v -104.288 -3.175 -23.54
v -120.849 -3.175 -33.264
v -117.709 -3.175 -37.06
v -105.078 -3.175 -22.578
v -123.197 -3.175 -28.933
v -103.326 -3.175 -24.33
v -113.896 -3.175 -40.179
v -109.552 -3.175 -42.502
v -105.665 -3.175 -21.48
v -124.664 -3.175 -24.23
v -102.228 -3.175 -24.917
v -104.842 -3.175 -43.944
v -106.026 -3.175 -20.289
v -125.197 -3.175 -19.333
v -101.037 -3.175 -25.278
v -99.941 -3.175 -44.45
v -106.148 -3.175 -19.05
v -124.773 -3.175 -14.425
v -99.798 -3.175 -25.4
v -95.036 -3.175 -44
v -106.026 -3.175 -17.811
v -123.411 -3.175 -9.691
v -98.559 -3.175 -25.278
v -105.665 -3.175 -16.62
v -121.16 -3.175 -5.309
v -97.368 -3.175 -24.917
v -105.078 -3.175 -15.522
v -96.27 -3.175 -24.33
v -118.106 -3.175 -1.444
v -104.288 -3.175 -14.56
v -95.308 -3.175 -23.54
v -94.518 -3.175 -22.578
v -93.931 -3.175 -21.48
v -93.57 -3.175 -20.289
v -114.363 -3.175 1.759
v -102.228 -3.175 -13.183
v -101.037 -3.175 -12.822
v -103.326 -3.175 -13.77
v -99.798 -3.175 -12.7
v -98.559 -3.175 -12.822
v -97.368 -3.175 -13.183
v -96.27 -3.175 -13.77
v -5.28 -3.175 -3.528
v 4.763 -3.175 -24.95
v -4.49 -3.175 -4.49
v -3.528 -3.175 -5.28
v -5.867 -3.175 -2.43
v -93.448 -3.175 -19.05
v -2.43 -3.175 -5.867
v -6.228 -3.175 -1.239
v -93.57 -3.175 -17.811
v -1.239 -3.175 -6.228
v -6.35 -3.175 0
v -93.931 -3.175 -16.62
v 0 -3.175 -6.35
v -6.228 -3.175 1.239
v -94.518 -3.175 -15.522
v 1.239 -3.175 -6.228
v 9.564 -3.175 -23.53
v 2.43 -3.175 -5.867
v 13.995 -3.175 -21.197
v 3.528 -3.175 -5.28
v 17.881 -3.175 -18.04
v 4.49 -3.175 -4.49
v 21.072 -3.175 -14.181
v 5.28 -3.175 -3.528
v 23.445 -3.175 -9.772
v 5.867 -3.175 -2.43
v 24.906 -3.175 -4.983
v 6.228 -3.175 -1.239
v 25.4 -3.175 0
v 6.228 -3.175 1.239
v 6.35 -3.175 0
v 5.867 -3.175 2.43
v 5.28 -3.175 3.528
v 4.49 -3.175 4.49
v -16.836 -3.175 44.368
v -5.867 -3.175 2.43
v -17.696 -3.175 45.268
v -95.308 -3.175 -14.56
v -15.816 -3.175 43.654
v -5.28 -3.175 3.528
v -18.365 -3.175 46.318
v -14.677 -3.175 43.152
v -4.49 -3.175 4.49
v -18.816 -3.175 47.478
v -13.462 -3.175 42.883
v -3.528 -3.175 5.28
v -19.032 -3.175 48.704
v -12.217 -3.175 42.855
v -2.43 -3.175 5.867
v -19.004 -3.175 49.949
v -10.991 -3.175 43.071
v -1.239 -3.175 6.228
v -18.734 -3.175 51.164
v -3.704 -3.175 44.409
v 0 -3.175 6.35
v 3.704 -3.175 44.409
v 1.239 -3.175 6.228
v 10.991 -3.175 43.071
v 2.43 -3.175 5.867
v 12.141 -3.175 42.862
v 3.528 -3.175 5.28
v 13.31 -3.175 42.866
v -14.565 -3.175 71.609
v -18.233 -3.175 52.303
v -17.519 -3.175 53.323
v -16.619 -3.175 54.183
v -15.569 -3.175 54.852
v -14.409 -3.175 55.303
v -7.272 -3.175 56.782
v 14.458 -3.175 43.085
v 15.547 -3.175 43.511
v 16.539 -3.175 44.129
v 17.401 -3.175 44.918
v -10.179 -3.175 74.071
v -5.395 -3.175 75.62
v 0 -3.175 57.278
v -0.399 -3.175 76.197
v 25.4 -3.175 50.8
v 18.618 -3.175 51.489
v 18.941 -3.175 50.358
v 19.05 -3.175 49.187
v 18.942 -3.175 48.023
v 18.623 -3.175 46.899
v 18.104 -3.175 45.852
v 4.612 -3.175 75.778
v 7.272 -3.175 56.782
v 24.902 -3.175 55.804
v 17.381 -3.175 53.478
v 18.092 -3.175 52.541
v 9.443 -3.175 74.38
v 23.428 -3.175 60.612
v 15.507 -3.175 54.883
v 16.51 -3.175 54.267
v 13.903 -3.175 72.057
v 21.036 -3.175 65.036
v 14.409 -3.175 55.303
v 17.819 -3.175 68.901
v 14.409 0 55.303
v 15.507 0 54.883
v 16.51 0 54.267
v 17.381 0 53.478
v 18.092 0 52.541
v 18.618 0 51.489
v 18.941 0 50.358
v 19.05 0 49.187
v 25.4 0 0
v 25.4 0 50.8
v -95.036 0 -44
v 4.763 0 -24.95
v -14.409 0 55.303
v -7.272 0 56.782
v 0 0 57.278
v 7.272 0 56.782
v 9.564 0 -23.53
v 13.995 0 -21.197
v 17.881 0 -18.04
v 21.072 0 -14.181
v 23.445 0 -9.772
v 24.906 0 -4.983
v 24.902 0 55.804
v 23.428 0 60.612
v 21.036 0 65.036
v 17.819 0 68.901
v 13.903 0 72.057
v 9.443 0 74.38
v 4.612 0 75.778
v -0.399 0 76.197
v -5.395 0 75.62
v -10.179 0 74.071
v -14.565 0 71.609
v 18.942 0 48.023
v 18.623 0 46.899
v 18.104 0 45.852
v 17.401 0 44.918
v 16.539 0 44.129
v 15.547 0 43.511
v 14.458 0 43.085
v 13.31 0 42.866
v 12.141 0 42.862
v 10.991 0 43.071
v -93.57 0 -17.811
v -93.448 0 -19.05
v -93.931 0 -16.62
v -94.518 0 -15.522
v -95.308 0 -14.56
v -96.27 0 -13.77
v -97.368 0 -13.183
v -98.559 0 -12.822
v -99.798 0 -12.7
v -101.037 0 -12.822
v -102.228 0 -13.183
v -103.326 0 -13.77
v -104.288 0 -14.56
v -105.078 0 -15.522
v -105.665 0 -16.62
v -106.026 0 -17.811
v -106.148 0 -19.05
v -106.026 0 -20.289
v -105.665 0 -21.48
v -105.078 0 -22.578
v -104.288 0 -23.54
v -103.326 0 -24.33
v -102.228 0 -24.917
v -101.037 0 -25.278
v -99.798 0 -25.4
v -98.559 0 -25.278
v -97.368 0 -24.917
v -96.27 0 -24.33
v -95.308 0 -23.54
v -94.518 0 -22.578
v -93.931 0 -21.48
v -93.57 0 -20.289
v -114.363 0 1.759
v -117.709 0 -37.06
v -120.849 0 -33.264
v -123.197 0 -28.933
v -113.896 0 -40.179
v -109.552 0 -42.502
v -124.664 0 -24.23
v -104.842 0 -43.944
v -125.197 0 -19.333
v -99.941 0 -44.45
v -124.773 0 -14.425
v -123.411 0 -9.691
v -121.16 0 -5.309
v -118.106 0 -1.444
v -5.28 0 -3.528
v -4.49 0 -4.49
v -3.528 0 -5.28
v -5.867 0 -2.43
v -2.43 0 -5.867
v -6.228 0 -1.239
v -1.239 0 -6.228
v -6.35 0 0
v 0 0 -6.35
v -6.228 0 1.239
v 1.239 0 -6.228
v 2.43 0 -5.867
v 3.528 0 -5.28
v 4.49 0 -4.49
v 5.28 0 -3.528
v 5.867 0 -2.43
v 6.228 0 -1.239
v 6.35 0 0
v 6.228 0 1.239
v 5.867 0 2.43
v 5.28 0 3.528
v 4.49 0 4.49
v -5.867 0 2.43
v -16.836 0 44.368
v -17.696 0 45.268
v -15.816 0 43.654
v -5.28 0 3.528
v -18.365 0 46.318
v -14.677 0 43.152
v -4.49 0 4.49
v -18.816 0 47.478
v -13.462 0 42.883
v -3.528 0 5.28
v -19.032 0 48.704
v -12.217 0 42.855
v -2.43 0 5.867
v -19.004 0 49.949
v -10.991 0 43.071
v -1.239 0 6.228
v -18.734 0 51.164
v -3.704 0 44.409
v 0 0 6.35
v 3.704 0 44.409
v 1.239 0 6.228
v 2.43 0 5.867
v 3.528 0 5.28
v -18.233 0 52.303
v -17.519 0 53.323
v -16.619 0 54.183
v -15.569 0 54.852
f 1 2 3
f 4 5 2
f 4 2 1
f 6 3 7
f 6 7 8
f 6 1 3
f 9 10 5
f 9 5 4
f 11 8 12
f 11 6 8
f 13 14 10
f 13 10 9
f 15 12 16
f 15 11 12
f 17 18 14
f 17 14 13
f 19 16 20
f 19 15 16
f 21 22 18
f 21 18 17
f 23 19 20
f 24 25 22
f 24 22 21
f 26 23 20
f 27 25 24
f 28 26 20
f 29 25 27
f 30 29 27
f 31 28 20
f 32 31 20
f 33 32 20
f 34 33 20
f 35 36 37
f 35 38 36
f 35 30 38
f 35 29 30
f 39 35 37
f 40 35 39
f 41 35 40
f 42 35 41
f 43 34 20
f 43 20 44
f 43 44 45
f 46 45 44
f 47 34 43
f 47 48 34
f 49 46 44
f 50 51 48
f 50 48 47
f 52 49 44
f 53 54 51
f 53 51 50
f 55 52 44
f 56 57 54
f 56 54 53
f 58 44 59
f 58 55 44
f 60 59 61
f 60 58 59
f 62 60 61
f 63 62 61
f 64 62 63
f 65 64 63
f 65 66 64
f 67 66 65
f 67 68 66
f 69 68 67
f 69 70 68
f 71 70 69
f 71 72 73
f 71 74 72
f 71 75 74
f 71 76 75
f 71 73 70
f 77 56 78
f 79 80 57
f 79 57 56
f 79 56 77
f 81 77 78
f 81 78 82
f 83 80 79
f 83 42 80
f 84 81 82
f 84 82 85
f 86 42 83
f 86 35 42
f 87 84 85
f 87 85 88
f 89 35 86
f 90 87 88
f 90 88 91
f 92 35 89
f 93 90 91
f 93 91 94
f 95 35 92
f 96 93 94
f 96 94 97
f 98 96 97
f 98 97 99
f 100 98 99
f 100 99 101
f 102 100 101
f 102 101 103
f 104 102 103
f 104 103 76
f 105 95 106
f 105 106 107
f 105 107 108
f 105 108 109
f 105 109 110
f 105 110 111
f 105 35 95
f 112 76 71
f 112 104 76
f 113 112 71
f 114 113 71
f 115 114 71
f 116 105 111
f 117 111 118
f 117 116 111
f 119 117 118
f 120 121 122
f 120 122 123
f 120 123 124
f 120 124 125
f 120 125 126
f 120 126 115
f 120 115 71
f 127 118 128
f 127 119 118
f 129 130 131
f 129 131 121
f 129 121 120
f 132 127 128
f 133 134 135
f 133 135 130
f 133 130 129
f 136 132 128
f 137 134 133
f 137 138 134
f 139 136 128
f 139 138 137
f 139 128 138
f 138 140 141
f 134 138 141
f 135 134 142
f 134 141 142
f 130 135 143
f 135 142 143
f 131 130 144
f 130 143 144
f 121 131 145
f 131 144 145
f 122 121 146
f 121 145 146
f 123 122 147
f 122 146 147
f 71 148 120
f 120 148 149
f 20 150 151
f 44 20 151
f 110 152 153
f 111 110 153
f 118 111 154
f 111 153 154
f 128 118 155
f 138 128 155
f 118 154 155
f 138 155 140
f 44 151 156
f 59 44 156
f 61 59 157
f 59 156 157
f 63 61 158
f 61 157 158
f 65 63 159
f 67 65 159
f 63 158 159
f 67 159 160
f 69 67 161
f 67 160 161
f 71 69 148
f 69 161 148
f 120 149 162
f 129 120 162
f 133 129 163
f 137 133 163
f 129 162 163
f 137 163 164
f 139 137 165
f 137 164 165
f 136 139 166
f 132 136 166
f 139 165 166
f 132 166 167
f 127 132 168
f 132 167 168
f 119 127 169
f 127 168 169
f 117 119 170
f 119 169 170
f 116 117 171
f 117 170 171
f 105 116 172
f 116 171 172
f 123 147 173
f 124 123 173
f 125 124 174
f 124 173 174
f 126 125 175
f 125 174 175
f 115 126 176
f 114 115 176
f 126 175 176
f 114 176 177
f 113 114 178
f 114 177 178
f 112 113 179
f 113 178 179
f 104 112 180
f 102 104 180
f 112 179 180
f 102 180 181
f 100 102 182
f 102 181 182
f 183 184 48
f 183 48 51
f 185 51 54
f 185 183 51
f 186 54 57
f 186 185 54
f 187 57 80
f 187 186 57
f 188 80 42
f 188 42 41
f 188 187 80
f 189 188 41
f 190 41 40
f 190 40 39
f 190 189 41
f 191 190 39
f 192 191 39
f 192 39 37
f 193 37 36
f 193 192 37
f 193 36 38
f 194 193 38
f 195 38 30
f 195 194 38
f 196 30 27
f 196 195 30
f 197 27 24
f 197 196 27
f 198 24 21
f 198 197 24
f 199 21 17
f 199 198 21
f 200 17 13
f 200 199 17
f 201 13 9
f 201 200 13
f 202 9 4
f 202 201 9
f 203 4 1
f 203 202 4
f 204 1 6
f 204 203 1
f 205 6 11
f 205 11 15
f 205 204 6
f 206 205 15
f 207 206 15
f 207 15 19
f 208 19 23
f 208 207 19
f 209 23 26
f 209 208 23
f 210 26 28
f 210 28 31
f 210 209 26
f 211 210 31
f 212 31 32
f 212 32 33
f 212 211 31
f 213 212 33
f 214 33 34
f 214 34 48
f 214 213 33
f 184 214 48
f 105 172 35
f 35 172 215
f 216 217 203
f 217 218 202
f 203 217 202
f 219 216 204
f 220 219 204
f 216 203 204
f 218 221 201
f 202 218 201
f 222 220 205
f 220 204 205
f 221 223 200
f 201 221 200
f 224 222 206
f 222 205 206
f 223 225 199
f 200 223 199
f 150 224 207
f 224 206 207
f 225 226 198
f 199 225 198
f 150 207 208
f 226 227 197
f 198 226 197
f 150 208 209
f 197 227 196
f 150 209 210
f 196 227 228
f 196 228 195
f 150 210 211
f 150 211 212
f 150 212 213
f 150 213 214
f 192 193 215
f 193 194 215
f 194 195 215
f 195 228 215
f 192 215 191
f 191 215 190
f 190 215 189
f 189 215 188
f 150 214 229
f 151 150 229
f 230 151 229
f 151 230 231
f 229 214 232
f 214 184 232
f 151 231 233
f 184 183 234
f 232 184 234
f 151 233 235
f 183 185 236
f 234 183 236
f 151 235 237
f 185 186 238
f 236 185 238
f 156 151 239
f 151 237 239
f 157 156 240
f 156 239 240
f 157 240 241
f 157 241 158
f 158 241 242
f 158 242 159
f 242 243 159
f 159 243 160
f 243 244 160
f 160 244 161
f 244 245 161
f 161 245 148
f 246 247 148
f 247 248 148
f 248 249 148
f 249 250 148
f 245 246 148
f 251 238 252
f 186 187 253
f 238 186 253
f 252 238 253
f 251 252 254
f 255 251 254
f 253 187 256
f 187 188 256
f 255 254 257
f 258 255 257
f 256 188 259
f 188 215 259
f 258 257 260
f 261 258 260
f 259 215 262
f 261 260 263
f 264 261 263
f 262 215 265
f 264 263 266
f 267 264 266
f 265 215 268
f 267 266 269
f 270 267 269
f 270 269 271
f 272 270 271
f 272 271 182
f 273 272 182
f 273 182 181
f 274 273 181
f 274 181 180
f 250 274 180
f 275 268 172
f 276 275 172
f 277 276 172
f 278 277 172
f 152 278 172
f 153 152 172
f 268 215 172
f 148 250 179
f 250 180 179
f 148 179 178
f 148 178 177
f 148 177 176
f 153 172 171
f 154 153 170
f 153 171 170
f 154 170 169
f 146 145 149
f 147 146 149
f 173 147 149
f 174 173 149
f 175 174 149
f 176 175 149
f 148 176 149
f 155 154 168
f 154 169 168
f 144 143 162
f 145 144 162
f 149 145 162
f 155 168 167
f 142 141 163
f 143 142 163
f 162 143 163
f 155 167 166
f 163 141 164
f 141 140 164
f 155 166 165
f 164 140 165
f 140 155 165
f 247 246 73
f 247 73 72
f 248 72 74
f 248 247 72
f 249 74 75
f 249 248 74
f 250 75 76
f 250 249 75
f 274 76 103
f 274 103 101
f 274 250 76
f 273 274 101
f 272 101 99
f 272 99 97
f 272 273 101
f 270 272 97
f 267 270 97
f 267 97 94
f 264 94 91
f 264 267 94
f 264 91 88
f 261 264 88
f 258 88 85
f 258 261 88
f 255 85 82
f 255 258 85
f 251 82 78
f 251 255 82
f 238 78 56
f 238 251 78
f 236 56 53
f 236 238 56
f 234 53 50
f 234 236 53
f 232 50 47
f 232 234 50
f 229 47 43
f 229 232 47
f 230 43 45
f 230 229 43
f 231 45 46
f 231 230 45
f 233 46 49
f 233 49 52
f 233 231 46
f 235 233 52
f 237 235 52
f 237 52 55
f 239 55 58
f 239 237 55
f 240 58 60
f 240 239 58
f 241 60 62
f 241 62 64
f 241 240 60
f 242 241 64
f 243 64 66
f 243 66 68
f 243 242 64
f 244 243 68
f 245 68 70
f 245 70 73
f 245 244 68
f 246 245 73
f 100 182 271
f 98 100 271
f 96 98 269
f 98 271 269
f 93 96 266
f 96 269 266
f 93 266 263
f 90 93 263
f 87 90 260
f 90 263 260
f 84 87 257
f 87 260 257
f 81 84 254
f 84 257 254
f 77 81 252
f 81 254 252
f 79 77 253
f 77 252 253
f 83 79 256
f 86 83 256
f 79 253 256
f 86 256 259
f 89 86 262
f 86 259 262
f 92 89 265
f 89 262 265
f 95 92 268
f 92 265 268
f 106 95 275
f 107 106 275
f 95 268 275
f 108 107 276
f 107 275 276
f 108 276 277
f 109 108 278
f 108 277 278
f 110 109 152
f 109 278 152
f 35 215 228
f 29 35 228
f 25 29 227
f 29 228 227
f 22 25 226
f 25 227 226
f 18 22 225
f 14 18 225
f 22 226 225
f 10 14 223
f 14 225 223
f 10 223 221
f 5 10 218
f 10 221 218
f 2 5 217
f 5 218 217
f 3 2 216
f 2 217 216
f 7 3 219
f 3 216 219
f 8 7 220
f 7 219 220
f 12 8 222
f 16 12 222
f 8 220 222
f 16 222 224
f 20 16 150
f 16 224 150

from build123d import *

# Parameters (mm, degrees)
F0_R     = 6.35
F1_DEPTH = 3.175


with BuildPart() as f1:
    # F0 (on Front) → F1 (new body)
    with BuildSketch(Plane.XZ):
        with BuildLine():
            ThreePointArc((0, 25.4), (-25.287129, -2.391879), (4.7625, -24.949521))
            ThreePointArc((4.7625, -24.949521), (19.572014, -16.189387), (25.4, 0))
            ThreePointArc((25.4, 0), (17.960512, 17.960512), (0, 25.4))
        make_face()
        Circle(F0_R, mode=Mode.SUBTRACT)
        with BuildLine():
            Line((-95.035584, -43.999521), (4.7625, -24.949521))
            ThreePointArc((4.7625, -24.949521), (-25.287129, -2.391879), (0, 25.4))
            ThreePointArc((0, 25.4), (-24.225165, 43.164465), (-14.564732, 71.609339))
            Line((-14.564732, 71.609339), (-114.362815, 1.759339))
            ThreePointArc((-114.362815, 1.759339), (-88.067444, 3.478917), (-74.398084, -19.05))
            ThreePointArc((-74.398084, -19.05), (-80.226069, -35.239387), (-95.035584, -43.999521))
        make_face()
        with BuildLine():
            ThreePointArc((0, 25.4), (17.960512, 17.960512), (25.4, 0))
            Line((25.4, 0), (25.4, 50.8))
            ThreePointArc((25.4, 50.8), (17.960512, 32.839488), (0, 25.4))
        make_face()
        with BuildLine():
            ThreePointArc((-14.564732, 71.609339), (-24.225165, 43.164465), (0, 25.4))
            ThreePointArc((0, 25.4), (17.960512, 32.839488), (25.4, 50.8))
            ThreePointArc((25.4, 50.8), (11.73064, 73.328917), (-14.564732, 71.609339))
        make_face()
        with BuildLine():
            ThreePointArc((-10.991184, 43.071134), (-18.815754, 47.478073), (-14.408816, 55.302643))
            ThreePointArc((-14.408816, 55.302643), (0, 57.277815), (14.408816, 55.302643))
            ThreePointArc((14.408816, 55.302643), (17.758334, 53.025607), (19.05, 49.186888))
            ThreePointArc((19.05, 49.186888), (16.538719, 44.128555), (10.991184, 43.071134))
            ThreePointArc((10.991184, 43.071134), (0, 44.577815), (-10.991184, 43.071134))
        make_face(mode=Mode.SUBTRACT)
        with BuildLine():
            ThreePointArc((-114.362815, 1.759339), (-123.196572, -28.932851), (-95.035584, -43.999521))
            ThreePointArc((-95.035584, -43.999521), (-80.226069, -35.239387), (-74.398084, -19.05))
            ThreePointArc((-74.398084, -19.05), (-88.067444, 3.478917), (-114.362815, 1.759339))
        make_face()
        with Locations((-99.798084, -19.05)):
            Circle(F0_R, mode=Mode.SUBTRACT)
    extrude(amount=F1_DEPTH)


solid = f1.part
